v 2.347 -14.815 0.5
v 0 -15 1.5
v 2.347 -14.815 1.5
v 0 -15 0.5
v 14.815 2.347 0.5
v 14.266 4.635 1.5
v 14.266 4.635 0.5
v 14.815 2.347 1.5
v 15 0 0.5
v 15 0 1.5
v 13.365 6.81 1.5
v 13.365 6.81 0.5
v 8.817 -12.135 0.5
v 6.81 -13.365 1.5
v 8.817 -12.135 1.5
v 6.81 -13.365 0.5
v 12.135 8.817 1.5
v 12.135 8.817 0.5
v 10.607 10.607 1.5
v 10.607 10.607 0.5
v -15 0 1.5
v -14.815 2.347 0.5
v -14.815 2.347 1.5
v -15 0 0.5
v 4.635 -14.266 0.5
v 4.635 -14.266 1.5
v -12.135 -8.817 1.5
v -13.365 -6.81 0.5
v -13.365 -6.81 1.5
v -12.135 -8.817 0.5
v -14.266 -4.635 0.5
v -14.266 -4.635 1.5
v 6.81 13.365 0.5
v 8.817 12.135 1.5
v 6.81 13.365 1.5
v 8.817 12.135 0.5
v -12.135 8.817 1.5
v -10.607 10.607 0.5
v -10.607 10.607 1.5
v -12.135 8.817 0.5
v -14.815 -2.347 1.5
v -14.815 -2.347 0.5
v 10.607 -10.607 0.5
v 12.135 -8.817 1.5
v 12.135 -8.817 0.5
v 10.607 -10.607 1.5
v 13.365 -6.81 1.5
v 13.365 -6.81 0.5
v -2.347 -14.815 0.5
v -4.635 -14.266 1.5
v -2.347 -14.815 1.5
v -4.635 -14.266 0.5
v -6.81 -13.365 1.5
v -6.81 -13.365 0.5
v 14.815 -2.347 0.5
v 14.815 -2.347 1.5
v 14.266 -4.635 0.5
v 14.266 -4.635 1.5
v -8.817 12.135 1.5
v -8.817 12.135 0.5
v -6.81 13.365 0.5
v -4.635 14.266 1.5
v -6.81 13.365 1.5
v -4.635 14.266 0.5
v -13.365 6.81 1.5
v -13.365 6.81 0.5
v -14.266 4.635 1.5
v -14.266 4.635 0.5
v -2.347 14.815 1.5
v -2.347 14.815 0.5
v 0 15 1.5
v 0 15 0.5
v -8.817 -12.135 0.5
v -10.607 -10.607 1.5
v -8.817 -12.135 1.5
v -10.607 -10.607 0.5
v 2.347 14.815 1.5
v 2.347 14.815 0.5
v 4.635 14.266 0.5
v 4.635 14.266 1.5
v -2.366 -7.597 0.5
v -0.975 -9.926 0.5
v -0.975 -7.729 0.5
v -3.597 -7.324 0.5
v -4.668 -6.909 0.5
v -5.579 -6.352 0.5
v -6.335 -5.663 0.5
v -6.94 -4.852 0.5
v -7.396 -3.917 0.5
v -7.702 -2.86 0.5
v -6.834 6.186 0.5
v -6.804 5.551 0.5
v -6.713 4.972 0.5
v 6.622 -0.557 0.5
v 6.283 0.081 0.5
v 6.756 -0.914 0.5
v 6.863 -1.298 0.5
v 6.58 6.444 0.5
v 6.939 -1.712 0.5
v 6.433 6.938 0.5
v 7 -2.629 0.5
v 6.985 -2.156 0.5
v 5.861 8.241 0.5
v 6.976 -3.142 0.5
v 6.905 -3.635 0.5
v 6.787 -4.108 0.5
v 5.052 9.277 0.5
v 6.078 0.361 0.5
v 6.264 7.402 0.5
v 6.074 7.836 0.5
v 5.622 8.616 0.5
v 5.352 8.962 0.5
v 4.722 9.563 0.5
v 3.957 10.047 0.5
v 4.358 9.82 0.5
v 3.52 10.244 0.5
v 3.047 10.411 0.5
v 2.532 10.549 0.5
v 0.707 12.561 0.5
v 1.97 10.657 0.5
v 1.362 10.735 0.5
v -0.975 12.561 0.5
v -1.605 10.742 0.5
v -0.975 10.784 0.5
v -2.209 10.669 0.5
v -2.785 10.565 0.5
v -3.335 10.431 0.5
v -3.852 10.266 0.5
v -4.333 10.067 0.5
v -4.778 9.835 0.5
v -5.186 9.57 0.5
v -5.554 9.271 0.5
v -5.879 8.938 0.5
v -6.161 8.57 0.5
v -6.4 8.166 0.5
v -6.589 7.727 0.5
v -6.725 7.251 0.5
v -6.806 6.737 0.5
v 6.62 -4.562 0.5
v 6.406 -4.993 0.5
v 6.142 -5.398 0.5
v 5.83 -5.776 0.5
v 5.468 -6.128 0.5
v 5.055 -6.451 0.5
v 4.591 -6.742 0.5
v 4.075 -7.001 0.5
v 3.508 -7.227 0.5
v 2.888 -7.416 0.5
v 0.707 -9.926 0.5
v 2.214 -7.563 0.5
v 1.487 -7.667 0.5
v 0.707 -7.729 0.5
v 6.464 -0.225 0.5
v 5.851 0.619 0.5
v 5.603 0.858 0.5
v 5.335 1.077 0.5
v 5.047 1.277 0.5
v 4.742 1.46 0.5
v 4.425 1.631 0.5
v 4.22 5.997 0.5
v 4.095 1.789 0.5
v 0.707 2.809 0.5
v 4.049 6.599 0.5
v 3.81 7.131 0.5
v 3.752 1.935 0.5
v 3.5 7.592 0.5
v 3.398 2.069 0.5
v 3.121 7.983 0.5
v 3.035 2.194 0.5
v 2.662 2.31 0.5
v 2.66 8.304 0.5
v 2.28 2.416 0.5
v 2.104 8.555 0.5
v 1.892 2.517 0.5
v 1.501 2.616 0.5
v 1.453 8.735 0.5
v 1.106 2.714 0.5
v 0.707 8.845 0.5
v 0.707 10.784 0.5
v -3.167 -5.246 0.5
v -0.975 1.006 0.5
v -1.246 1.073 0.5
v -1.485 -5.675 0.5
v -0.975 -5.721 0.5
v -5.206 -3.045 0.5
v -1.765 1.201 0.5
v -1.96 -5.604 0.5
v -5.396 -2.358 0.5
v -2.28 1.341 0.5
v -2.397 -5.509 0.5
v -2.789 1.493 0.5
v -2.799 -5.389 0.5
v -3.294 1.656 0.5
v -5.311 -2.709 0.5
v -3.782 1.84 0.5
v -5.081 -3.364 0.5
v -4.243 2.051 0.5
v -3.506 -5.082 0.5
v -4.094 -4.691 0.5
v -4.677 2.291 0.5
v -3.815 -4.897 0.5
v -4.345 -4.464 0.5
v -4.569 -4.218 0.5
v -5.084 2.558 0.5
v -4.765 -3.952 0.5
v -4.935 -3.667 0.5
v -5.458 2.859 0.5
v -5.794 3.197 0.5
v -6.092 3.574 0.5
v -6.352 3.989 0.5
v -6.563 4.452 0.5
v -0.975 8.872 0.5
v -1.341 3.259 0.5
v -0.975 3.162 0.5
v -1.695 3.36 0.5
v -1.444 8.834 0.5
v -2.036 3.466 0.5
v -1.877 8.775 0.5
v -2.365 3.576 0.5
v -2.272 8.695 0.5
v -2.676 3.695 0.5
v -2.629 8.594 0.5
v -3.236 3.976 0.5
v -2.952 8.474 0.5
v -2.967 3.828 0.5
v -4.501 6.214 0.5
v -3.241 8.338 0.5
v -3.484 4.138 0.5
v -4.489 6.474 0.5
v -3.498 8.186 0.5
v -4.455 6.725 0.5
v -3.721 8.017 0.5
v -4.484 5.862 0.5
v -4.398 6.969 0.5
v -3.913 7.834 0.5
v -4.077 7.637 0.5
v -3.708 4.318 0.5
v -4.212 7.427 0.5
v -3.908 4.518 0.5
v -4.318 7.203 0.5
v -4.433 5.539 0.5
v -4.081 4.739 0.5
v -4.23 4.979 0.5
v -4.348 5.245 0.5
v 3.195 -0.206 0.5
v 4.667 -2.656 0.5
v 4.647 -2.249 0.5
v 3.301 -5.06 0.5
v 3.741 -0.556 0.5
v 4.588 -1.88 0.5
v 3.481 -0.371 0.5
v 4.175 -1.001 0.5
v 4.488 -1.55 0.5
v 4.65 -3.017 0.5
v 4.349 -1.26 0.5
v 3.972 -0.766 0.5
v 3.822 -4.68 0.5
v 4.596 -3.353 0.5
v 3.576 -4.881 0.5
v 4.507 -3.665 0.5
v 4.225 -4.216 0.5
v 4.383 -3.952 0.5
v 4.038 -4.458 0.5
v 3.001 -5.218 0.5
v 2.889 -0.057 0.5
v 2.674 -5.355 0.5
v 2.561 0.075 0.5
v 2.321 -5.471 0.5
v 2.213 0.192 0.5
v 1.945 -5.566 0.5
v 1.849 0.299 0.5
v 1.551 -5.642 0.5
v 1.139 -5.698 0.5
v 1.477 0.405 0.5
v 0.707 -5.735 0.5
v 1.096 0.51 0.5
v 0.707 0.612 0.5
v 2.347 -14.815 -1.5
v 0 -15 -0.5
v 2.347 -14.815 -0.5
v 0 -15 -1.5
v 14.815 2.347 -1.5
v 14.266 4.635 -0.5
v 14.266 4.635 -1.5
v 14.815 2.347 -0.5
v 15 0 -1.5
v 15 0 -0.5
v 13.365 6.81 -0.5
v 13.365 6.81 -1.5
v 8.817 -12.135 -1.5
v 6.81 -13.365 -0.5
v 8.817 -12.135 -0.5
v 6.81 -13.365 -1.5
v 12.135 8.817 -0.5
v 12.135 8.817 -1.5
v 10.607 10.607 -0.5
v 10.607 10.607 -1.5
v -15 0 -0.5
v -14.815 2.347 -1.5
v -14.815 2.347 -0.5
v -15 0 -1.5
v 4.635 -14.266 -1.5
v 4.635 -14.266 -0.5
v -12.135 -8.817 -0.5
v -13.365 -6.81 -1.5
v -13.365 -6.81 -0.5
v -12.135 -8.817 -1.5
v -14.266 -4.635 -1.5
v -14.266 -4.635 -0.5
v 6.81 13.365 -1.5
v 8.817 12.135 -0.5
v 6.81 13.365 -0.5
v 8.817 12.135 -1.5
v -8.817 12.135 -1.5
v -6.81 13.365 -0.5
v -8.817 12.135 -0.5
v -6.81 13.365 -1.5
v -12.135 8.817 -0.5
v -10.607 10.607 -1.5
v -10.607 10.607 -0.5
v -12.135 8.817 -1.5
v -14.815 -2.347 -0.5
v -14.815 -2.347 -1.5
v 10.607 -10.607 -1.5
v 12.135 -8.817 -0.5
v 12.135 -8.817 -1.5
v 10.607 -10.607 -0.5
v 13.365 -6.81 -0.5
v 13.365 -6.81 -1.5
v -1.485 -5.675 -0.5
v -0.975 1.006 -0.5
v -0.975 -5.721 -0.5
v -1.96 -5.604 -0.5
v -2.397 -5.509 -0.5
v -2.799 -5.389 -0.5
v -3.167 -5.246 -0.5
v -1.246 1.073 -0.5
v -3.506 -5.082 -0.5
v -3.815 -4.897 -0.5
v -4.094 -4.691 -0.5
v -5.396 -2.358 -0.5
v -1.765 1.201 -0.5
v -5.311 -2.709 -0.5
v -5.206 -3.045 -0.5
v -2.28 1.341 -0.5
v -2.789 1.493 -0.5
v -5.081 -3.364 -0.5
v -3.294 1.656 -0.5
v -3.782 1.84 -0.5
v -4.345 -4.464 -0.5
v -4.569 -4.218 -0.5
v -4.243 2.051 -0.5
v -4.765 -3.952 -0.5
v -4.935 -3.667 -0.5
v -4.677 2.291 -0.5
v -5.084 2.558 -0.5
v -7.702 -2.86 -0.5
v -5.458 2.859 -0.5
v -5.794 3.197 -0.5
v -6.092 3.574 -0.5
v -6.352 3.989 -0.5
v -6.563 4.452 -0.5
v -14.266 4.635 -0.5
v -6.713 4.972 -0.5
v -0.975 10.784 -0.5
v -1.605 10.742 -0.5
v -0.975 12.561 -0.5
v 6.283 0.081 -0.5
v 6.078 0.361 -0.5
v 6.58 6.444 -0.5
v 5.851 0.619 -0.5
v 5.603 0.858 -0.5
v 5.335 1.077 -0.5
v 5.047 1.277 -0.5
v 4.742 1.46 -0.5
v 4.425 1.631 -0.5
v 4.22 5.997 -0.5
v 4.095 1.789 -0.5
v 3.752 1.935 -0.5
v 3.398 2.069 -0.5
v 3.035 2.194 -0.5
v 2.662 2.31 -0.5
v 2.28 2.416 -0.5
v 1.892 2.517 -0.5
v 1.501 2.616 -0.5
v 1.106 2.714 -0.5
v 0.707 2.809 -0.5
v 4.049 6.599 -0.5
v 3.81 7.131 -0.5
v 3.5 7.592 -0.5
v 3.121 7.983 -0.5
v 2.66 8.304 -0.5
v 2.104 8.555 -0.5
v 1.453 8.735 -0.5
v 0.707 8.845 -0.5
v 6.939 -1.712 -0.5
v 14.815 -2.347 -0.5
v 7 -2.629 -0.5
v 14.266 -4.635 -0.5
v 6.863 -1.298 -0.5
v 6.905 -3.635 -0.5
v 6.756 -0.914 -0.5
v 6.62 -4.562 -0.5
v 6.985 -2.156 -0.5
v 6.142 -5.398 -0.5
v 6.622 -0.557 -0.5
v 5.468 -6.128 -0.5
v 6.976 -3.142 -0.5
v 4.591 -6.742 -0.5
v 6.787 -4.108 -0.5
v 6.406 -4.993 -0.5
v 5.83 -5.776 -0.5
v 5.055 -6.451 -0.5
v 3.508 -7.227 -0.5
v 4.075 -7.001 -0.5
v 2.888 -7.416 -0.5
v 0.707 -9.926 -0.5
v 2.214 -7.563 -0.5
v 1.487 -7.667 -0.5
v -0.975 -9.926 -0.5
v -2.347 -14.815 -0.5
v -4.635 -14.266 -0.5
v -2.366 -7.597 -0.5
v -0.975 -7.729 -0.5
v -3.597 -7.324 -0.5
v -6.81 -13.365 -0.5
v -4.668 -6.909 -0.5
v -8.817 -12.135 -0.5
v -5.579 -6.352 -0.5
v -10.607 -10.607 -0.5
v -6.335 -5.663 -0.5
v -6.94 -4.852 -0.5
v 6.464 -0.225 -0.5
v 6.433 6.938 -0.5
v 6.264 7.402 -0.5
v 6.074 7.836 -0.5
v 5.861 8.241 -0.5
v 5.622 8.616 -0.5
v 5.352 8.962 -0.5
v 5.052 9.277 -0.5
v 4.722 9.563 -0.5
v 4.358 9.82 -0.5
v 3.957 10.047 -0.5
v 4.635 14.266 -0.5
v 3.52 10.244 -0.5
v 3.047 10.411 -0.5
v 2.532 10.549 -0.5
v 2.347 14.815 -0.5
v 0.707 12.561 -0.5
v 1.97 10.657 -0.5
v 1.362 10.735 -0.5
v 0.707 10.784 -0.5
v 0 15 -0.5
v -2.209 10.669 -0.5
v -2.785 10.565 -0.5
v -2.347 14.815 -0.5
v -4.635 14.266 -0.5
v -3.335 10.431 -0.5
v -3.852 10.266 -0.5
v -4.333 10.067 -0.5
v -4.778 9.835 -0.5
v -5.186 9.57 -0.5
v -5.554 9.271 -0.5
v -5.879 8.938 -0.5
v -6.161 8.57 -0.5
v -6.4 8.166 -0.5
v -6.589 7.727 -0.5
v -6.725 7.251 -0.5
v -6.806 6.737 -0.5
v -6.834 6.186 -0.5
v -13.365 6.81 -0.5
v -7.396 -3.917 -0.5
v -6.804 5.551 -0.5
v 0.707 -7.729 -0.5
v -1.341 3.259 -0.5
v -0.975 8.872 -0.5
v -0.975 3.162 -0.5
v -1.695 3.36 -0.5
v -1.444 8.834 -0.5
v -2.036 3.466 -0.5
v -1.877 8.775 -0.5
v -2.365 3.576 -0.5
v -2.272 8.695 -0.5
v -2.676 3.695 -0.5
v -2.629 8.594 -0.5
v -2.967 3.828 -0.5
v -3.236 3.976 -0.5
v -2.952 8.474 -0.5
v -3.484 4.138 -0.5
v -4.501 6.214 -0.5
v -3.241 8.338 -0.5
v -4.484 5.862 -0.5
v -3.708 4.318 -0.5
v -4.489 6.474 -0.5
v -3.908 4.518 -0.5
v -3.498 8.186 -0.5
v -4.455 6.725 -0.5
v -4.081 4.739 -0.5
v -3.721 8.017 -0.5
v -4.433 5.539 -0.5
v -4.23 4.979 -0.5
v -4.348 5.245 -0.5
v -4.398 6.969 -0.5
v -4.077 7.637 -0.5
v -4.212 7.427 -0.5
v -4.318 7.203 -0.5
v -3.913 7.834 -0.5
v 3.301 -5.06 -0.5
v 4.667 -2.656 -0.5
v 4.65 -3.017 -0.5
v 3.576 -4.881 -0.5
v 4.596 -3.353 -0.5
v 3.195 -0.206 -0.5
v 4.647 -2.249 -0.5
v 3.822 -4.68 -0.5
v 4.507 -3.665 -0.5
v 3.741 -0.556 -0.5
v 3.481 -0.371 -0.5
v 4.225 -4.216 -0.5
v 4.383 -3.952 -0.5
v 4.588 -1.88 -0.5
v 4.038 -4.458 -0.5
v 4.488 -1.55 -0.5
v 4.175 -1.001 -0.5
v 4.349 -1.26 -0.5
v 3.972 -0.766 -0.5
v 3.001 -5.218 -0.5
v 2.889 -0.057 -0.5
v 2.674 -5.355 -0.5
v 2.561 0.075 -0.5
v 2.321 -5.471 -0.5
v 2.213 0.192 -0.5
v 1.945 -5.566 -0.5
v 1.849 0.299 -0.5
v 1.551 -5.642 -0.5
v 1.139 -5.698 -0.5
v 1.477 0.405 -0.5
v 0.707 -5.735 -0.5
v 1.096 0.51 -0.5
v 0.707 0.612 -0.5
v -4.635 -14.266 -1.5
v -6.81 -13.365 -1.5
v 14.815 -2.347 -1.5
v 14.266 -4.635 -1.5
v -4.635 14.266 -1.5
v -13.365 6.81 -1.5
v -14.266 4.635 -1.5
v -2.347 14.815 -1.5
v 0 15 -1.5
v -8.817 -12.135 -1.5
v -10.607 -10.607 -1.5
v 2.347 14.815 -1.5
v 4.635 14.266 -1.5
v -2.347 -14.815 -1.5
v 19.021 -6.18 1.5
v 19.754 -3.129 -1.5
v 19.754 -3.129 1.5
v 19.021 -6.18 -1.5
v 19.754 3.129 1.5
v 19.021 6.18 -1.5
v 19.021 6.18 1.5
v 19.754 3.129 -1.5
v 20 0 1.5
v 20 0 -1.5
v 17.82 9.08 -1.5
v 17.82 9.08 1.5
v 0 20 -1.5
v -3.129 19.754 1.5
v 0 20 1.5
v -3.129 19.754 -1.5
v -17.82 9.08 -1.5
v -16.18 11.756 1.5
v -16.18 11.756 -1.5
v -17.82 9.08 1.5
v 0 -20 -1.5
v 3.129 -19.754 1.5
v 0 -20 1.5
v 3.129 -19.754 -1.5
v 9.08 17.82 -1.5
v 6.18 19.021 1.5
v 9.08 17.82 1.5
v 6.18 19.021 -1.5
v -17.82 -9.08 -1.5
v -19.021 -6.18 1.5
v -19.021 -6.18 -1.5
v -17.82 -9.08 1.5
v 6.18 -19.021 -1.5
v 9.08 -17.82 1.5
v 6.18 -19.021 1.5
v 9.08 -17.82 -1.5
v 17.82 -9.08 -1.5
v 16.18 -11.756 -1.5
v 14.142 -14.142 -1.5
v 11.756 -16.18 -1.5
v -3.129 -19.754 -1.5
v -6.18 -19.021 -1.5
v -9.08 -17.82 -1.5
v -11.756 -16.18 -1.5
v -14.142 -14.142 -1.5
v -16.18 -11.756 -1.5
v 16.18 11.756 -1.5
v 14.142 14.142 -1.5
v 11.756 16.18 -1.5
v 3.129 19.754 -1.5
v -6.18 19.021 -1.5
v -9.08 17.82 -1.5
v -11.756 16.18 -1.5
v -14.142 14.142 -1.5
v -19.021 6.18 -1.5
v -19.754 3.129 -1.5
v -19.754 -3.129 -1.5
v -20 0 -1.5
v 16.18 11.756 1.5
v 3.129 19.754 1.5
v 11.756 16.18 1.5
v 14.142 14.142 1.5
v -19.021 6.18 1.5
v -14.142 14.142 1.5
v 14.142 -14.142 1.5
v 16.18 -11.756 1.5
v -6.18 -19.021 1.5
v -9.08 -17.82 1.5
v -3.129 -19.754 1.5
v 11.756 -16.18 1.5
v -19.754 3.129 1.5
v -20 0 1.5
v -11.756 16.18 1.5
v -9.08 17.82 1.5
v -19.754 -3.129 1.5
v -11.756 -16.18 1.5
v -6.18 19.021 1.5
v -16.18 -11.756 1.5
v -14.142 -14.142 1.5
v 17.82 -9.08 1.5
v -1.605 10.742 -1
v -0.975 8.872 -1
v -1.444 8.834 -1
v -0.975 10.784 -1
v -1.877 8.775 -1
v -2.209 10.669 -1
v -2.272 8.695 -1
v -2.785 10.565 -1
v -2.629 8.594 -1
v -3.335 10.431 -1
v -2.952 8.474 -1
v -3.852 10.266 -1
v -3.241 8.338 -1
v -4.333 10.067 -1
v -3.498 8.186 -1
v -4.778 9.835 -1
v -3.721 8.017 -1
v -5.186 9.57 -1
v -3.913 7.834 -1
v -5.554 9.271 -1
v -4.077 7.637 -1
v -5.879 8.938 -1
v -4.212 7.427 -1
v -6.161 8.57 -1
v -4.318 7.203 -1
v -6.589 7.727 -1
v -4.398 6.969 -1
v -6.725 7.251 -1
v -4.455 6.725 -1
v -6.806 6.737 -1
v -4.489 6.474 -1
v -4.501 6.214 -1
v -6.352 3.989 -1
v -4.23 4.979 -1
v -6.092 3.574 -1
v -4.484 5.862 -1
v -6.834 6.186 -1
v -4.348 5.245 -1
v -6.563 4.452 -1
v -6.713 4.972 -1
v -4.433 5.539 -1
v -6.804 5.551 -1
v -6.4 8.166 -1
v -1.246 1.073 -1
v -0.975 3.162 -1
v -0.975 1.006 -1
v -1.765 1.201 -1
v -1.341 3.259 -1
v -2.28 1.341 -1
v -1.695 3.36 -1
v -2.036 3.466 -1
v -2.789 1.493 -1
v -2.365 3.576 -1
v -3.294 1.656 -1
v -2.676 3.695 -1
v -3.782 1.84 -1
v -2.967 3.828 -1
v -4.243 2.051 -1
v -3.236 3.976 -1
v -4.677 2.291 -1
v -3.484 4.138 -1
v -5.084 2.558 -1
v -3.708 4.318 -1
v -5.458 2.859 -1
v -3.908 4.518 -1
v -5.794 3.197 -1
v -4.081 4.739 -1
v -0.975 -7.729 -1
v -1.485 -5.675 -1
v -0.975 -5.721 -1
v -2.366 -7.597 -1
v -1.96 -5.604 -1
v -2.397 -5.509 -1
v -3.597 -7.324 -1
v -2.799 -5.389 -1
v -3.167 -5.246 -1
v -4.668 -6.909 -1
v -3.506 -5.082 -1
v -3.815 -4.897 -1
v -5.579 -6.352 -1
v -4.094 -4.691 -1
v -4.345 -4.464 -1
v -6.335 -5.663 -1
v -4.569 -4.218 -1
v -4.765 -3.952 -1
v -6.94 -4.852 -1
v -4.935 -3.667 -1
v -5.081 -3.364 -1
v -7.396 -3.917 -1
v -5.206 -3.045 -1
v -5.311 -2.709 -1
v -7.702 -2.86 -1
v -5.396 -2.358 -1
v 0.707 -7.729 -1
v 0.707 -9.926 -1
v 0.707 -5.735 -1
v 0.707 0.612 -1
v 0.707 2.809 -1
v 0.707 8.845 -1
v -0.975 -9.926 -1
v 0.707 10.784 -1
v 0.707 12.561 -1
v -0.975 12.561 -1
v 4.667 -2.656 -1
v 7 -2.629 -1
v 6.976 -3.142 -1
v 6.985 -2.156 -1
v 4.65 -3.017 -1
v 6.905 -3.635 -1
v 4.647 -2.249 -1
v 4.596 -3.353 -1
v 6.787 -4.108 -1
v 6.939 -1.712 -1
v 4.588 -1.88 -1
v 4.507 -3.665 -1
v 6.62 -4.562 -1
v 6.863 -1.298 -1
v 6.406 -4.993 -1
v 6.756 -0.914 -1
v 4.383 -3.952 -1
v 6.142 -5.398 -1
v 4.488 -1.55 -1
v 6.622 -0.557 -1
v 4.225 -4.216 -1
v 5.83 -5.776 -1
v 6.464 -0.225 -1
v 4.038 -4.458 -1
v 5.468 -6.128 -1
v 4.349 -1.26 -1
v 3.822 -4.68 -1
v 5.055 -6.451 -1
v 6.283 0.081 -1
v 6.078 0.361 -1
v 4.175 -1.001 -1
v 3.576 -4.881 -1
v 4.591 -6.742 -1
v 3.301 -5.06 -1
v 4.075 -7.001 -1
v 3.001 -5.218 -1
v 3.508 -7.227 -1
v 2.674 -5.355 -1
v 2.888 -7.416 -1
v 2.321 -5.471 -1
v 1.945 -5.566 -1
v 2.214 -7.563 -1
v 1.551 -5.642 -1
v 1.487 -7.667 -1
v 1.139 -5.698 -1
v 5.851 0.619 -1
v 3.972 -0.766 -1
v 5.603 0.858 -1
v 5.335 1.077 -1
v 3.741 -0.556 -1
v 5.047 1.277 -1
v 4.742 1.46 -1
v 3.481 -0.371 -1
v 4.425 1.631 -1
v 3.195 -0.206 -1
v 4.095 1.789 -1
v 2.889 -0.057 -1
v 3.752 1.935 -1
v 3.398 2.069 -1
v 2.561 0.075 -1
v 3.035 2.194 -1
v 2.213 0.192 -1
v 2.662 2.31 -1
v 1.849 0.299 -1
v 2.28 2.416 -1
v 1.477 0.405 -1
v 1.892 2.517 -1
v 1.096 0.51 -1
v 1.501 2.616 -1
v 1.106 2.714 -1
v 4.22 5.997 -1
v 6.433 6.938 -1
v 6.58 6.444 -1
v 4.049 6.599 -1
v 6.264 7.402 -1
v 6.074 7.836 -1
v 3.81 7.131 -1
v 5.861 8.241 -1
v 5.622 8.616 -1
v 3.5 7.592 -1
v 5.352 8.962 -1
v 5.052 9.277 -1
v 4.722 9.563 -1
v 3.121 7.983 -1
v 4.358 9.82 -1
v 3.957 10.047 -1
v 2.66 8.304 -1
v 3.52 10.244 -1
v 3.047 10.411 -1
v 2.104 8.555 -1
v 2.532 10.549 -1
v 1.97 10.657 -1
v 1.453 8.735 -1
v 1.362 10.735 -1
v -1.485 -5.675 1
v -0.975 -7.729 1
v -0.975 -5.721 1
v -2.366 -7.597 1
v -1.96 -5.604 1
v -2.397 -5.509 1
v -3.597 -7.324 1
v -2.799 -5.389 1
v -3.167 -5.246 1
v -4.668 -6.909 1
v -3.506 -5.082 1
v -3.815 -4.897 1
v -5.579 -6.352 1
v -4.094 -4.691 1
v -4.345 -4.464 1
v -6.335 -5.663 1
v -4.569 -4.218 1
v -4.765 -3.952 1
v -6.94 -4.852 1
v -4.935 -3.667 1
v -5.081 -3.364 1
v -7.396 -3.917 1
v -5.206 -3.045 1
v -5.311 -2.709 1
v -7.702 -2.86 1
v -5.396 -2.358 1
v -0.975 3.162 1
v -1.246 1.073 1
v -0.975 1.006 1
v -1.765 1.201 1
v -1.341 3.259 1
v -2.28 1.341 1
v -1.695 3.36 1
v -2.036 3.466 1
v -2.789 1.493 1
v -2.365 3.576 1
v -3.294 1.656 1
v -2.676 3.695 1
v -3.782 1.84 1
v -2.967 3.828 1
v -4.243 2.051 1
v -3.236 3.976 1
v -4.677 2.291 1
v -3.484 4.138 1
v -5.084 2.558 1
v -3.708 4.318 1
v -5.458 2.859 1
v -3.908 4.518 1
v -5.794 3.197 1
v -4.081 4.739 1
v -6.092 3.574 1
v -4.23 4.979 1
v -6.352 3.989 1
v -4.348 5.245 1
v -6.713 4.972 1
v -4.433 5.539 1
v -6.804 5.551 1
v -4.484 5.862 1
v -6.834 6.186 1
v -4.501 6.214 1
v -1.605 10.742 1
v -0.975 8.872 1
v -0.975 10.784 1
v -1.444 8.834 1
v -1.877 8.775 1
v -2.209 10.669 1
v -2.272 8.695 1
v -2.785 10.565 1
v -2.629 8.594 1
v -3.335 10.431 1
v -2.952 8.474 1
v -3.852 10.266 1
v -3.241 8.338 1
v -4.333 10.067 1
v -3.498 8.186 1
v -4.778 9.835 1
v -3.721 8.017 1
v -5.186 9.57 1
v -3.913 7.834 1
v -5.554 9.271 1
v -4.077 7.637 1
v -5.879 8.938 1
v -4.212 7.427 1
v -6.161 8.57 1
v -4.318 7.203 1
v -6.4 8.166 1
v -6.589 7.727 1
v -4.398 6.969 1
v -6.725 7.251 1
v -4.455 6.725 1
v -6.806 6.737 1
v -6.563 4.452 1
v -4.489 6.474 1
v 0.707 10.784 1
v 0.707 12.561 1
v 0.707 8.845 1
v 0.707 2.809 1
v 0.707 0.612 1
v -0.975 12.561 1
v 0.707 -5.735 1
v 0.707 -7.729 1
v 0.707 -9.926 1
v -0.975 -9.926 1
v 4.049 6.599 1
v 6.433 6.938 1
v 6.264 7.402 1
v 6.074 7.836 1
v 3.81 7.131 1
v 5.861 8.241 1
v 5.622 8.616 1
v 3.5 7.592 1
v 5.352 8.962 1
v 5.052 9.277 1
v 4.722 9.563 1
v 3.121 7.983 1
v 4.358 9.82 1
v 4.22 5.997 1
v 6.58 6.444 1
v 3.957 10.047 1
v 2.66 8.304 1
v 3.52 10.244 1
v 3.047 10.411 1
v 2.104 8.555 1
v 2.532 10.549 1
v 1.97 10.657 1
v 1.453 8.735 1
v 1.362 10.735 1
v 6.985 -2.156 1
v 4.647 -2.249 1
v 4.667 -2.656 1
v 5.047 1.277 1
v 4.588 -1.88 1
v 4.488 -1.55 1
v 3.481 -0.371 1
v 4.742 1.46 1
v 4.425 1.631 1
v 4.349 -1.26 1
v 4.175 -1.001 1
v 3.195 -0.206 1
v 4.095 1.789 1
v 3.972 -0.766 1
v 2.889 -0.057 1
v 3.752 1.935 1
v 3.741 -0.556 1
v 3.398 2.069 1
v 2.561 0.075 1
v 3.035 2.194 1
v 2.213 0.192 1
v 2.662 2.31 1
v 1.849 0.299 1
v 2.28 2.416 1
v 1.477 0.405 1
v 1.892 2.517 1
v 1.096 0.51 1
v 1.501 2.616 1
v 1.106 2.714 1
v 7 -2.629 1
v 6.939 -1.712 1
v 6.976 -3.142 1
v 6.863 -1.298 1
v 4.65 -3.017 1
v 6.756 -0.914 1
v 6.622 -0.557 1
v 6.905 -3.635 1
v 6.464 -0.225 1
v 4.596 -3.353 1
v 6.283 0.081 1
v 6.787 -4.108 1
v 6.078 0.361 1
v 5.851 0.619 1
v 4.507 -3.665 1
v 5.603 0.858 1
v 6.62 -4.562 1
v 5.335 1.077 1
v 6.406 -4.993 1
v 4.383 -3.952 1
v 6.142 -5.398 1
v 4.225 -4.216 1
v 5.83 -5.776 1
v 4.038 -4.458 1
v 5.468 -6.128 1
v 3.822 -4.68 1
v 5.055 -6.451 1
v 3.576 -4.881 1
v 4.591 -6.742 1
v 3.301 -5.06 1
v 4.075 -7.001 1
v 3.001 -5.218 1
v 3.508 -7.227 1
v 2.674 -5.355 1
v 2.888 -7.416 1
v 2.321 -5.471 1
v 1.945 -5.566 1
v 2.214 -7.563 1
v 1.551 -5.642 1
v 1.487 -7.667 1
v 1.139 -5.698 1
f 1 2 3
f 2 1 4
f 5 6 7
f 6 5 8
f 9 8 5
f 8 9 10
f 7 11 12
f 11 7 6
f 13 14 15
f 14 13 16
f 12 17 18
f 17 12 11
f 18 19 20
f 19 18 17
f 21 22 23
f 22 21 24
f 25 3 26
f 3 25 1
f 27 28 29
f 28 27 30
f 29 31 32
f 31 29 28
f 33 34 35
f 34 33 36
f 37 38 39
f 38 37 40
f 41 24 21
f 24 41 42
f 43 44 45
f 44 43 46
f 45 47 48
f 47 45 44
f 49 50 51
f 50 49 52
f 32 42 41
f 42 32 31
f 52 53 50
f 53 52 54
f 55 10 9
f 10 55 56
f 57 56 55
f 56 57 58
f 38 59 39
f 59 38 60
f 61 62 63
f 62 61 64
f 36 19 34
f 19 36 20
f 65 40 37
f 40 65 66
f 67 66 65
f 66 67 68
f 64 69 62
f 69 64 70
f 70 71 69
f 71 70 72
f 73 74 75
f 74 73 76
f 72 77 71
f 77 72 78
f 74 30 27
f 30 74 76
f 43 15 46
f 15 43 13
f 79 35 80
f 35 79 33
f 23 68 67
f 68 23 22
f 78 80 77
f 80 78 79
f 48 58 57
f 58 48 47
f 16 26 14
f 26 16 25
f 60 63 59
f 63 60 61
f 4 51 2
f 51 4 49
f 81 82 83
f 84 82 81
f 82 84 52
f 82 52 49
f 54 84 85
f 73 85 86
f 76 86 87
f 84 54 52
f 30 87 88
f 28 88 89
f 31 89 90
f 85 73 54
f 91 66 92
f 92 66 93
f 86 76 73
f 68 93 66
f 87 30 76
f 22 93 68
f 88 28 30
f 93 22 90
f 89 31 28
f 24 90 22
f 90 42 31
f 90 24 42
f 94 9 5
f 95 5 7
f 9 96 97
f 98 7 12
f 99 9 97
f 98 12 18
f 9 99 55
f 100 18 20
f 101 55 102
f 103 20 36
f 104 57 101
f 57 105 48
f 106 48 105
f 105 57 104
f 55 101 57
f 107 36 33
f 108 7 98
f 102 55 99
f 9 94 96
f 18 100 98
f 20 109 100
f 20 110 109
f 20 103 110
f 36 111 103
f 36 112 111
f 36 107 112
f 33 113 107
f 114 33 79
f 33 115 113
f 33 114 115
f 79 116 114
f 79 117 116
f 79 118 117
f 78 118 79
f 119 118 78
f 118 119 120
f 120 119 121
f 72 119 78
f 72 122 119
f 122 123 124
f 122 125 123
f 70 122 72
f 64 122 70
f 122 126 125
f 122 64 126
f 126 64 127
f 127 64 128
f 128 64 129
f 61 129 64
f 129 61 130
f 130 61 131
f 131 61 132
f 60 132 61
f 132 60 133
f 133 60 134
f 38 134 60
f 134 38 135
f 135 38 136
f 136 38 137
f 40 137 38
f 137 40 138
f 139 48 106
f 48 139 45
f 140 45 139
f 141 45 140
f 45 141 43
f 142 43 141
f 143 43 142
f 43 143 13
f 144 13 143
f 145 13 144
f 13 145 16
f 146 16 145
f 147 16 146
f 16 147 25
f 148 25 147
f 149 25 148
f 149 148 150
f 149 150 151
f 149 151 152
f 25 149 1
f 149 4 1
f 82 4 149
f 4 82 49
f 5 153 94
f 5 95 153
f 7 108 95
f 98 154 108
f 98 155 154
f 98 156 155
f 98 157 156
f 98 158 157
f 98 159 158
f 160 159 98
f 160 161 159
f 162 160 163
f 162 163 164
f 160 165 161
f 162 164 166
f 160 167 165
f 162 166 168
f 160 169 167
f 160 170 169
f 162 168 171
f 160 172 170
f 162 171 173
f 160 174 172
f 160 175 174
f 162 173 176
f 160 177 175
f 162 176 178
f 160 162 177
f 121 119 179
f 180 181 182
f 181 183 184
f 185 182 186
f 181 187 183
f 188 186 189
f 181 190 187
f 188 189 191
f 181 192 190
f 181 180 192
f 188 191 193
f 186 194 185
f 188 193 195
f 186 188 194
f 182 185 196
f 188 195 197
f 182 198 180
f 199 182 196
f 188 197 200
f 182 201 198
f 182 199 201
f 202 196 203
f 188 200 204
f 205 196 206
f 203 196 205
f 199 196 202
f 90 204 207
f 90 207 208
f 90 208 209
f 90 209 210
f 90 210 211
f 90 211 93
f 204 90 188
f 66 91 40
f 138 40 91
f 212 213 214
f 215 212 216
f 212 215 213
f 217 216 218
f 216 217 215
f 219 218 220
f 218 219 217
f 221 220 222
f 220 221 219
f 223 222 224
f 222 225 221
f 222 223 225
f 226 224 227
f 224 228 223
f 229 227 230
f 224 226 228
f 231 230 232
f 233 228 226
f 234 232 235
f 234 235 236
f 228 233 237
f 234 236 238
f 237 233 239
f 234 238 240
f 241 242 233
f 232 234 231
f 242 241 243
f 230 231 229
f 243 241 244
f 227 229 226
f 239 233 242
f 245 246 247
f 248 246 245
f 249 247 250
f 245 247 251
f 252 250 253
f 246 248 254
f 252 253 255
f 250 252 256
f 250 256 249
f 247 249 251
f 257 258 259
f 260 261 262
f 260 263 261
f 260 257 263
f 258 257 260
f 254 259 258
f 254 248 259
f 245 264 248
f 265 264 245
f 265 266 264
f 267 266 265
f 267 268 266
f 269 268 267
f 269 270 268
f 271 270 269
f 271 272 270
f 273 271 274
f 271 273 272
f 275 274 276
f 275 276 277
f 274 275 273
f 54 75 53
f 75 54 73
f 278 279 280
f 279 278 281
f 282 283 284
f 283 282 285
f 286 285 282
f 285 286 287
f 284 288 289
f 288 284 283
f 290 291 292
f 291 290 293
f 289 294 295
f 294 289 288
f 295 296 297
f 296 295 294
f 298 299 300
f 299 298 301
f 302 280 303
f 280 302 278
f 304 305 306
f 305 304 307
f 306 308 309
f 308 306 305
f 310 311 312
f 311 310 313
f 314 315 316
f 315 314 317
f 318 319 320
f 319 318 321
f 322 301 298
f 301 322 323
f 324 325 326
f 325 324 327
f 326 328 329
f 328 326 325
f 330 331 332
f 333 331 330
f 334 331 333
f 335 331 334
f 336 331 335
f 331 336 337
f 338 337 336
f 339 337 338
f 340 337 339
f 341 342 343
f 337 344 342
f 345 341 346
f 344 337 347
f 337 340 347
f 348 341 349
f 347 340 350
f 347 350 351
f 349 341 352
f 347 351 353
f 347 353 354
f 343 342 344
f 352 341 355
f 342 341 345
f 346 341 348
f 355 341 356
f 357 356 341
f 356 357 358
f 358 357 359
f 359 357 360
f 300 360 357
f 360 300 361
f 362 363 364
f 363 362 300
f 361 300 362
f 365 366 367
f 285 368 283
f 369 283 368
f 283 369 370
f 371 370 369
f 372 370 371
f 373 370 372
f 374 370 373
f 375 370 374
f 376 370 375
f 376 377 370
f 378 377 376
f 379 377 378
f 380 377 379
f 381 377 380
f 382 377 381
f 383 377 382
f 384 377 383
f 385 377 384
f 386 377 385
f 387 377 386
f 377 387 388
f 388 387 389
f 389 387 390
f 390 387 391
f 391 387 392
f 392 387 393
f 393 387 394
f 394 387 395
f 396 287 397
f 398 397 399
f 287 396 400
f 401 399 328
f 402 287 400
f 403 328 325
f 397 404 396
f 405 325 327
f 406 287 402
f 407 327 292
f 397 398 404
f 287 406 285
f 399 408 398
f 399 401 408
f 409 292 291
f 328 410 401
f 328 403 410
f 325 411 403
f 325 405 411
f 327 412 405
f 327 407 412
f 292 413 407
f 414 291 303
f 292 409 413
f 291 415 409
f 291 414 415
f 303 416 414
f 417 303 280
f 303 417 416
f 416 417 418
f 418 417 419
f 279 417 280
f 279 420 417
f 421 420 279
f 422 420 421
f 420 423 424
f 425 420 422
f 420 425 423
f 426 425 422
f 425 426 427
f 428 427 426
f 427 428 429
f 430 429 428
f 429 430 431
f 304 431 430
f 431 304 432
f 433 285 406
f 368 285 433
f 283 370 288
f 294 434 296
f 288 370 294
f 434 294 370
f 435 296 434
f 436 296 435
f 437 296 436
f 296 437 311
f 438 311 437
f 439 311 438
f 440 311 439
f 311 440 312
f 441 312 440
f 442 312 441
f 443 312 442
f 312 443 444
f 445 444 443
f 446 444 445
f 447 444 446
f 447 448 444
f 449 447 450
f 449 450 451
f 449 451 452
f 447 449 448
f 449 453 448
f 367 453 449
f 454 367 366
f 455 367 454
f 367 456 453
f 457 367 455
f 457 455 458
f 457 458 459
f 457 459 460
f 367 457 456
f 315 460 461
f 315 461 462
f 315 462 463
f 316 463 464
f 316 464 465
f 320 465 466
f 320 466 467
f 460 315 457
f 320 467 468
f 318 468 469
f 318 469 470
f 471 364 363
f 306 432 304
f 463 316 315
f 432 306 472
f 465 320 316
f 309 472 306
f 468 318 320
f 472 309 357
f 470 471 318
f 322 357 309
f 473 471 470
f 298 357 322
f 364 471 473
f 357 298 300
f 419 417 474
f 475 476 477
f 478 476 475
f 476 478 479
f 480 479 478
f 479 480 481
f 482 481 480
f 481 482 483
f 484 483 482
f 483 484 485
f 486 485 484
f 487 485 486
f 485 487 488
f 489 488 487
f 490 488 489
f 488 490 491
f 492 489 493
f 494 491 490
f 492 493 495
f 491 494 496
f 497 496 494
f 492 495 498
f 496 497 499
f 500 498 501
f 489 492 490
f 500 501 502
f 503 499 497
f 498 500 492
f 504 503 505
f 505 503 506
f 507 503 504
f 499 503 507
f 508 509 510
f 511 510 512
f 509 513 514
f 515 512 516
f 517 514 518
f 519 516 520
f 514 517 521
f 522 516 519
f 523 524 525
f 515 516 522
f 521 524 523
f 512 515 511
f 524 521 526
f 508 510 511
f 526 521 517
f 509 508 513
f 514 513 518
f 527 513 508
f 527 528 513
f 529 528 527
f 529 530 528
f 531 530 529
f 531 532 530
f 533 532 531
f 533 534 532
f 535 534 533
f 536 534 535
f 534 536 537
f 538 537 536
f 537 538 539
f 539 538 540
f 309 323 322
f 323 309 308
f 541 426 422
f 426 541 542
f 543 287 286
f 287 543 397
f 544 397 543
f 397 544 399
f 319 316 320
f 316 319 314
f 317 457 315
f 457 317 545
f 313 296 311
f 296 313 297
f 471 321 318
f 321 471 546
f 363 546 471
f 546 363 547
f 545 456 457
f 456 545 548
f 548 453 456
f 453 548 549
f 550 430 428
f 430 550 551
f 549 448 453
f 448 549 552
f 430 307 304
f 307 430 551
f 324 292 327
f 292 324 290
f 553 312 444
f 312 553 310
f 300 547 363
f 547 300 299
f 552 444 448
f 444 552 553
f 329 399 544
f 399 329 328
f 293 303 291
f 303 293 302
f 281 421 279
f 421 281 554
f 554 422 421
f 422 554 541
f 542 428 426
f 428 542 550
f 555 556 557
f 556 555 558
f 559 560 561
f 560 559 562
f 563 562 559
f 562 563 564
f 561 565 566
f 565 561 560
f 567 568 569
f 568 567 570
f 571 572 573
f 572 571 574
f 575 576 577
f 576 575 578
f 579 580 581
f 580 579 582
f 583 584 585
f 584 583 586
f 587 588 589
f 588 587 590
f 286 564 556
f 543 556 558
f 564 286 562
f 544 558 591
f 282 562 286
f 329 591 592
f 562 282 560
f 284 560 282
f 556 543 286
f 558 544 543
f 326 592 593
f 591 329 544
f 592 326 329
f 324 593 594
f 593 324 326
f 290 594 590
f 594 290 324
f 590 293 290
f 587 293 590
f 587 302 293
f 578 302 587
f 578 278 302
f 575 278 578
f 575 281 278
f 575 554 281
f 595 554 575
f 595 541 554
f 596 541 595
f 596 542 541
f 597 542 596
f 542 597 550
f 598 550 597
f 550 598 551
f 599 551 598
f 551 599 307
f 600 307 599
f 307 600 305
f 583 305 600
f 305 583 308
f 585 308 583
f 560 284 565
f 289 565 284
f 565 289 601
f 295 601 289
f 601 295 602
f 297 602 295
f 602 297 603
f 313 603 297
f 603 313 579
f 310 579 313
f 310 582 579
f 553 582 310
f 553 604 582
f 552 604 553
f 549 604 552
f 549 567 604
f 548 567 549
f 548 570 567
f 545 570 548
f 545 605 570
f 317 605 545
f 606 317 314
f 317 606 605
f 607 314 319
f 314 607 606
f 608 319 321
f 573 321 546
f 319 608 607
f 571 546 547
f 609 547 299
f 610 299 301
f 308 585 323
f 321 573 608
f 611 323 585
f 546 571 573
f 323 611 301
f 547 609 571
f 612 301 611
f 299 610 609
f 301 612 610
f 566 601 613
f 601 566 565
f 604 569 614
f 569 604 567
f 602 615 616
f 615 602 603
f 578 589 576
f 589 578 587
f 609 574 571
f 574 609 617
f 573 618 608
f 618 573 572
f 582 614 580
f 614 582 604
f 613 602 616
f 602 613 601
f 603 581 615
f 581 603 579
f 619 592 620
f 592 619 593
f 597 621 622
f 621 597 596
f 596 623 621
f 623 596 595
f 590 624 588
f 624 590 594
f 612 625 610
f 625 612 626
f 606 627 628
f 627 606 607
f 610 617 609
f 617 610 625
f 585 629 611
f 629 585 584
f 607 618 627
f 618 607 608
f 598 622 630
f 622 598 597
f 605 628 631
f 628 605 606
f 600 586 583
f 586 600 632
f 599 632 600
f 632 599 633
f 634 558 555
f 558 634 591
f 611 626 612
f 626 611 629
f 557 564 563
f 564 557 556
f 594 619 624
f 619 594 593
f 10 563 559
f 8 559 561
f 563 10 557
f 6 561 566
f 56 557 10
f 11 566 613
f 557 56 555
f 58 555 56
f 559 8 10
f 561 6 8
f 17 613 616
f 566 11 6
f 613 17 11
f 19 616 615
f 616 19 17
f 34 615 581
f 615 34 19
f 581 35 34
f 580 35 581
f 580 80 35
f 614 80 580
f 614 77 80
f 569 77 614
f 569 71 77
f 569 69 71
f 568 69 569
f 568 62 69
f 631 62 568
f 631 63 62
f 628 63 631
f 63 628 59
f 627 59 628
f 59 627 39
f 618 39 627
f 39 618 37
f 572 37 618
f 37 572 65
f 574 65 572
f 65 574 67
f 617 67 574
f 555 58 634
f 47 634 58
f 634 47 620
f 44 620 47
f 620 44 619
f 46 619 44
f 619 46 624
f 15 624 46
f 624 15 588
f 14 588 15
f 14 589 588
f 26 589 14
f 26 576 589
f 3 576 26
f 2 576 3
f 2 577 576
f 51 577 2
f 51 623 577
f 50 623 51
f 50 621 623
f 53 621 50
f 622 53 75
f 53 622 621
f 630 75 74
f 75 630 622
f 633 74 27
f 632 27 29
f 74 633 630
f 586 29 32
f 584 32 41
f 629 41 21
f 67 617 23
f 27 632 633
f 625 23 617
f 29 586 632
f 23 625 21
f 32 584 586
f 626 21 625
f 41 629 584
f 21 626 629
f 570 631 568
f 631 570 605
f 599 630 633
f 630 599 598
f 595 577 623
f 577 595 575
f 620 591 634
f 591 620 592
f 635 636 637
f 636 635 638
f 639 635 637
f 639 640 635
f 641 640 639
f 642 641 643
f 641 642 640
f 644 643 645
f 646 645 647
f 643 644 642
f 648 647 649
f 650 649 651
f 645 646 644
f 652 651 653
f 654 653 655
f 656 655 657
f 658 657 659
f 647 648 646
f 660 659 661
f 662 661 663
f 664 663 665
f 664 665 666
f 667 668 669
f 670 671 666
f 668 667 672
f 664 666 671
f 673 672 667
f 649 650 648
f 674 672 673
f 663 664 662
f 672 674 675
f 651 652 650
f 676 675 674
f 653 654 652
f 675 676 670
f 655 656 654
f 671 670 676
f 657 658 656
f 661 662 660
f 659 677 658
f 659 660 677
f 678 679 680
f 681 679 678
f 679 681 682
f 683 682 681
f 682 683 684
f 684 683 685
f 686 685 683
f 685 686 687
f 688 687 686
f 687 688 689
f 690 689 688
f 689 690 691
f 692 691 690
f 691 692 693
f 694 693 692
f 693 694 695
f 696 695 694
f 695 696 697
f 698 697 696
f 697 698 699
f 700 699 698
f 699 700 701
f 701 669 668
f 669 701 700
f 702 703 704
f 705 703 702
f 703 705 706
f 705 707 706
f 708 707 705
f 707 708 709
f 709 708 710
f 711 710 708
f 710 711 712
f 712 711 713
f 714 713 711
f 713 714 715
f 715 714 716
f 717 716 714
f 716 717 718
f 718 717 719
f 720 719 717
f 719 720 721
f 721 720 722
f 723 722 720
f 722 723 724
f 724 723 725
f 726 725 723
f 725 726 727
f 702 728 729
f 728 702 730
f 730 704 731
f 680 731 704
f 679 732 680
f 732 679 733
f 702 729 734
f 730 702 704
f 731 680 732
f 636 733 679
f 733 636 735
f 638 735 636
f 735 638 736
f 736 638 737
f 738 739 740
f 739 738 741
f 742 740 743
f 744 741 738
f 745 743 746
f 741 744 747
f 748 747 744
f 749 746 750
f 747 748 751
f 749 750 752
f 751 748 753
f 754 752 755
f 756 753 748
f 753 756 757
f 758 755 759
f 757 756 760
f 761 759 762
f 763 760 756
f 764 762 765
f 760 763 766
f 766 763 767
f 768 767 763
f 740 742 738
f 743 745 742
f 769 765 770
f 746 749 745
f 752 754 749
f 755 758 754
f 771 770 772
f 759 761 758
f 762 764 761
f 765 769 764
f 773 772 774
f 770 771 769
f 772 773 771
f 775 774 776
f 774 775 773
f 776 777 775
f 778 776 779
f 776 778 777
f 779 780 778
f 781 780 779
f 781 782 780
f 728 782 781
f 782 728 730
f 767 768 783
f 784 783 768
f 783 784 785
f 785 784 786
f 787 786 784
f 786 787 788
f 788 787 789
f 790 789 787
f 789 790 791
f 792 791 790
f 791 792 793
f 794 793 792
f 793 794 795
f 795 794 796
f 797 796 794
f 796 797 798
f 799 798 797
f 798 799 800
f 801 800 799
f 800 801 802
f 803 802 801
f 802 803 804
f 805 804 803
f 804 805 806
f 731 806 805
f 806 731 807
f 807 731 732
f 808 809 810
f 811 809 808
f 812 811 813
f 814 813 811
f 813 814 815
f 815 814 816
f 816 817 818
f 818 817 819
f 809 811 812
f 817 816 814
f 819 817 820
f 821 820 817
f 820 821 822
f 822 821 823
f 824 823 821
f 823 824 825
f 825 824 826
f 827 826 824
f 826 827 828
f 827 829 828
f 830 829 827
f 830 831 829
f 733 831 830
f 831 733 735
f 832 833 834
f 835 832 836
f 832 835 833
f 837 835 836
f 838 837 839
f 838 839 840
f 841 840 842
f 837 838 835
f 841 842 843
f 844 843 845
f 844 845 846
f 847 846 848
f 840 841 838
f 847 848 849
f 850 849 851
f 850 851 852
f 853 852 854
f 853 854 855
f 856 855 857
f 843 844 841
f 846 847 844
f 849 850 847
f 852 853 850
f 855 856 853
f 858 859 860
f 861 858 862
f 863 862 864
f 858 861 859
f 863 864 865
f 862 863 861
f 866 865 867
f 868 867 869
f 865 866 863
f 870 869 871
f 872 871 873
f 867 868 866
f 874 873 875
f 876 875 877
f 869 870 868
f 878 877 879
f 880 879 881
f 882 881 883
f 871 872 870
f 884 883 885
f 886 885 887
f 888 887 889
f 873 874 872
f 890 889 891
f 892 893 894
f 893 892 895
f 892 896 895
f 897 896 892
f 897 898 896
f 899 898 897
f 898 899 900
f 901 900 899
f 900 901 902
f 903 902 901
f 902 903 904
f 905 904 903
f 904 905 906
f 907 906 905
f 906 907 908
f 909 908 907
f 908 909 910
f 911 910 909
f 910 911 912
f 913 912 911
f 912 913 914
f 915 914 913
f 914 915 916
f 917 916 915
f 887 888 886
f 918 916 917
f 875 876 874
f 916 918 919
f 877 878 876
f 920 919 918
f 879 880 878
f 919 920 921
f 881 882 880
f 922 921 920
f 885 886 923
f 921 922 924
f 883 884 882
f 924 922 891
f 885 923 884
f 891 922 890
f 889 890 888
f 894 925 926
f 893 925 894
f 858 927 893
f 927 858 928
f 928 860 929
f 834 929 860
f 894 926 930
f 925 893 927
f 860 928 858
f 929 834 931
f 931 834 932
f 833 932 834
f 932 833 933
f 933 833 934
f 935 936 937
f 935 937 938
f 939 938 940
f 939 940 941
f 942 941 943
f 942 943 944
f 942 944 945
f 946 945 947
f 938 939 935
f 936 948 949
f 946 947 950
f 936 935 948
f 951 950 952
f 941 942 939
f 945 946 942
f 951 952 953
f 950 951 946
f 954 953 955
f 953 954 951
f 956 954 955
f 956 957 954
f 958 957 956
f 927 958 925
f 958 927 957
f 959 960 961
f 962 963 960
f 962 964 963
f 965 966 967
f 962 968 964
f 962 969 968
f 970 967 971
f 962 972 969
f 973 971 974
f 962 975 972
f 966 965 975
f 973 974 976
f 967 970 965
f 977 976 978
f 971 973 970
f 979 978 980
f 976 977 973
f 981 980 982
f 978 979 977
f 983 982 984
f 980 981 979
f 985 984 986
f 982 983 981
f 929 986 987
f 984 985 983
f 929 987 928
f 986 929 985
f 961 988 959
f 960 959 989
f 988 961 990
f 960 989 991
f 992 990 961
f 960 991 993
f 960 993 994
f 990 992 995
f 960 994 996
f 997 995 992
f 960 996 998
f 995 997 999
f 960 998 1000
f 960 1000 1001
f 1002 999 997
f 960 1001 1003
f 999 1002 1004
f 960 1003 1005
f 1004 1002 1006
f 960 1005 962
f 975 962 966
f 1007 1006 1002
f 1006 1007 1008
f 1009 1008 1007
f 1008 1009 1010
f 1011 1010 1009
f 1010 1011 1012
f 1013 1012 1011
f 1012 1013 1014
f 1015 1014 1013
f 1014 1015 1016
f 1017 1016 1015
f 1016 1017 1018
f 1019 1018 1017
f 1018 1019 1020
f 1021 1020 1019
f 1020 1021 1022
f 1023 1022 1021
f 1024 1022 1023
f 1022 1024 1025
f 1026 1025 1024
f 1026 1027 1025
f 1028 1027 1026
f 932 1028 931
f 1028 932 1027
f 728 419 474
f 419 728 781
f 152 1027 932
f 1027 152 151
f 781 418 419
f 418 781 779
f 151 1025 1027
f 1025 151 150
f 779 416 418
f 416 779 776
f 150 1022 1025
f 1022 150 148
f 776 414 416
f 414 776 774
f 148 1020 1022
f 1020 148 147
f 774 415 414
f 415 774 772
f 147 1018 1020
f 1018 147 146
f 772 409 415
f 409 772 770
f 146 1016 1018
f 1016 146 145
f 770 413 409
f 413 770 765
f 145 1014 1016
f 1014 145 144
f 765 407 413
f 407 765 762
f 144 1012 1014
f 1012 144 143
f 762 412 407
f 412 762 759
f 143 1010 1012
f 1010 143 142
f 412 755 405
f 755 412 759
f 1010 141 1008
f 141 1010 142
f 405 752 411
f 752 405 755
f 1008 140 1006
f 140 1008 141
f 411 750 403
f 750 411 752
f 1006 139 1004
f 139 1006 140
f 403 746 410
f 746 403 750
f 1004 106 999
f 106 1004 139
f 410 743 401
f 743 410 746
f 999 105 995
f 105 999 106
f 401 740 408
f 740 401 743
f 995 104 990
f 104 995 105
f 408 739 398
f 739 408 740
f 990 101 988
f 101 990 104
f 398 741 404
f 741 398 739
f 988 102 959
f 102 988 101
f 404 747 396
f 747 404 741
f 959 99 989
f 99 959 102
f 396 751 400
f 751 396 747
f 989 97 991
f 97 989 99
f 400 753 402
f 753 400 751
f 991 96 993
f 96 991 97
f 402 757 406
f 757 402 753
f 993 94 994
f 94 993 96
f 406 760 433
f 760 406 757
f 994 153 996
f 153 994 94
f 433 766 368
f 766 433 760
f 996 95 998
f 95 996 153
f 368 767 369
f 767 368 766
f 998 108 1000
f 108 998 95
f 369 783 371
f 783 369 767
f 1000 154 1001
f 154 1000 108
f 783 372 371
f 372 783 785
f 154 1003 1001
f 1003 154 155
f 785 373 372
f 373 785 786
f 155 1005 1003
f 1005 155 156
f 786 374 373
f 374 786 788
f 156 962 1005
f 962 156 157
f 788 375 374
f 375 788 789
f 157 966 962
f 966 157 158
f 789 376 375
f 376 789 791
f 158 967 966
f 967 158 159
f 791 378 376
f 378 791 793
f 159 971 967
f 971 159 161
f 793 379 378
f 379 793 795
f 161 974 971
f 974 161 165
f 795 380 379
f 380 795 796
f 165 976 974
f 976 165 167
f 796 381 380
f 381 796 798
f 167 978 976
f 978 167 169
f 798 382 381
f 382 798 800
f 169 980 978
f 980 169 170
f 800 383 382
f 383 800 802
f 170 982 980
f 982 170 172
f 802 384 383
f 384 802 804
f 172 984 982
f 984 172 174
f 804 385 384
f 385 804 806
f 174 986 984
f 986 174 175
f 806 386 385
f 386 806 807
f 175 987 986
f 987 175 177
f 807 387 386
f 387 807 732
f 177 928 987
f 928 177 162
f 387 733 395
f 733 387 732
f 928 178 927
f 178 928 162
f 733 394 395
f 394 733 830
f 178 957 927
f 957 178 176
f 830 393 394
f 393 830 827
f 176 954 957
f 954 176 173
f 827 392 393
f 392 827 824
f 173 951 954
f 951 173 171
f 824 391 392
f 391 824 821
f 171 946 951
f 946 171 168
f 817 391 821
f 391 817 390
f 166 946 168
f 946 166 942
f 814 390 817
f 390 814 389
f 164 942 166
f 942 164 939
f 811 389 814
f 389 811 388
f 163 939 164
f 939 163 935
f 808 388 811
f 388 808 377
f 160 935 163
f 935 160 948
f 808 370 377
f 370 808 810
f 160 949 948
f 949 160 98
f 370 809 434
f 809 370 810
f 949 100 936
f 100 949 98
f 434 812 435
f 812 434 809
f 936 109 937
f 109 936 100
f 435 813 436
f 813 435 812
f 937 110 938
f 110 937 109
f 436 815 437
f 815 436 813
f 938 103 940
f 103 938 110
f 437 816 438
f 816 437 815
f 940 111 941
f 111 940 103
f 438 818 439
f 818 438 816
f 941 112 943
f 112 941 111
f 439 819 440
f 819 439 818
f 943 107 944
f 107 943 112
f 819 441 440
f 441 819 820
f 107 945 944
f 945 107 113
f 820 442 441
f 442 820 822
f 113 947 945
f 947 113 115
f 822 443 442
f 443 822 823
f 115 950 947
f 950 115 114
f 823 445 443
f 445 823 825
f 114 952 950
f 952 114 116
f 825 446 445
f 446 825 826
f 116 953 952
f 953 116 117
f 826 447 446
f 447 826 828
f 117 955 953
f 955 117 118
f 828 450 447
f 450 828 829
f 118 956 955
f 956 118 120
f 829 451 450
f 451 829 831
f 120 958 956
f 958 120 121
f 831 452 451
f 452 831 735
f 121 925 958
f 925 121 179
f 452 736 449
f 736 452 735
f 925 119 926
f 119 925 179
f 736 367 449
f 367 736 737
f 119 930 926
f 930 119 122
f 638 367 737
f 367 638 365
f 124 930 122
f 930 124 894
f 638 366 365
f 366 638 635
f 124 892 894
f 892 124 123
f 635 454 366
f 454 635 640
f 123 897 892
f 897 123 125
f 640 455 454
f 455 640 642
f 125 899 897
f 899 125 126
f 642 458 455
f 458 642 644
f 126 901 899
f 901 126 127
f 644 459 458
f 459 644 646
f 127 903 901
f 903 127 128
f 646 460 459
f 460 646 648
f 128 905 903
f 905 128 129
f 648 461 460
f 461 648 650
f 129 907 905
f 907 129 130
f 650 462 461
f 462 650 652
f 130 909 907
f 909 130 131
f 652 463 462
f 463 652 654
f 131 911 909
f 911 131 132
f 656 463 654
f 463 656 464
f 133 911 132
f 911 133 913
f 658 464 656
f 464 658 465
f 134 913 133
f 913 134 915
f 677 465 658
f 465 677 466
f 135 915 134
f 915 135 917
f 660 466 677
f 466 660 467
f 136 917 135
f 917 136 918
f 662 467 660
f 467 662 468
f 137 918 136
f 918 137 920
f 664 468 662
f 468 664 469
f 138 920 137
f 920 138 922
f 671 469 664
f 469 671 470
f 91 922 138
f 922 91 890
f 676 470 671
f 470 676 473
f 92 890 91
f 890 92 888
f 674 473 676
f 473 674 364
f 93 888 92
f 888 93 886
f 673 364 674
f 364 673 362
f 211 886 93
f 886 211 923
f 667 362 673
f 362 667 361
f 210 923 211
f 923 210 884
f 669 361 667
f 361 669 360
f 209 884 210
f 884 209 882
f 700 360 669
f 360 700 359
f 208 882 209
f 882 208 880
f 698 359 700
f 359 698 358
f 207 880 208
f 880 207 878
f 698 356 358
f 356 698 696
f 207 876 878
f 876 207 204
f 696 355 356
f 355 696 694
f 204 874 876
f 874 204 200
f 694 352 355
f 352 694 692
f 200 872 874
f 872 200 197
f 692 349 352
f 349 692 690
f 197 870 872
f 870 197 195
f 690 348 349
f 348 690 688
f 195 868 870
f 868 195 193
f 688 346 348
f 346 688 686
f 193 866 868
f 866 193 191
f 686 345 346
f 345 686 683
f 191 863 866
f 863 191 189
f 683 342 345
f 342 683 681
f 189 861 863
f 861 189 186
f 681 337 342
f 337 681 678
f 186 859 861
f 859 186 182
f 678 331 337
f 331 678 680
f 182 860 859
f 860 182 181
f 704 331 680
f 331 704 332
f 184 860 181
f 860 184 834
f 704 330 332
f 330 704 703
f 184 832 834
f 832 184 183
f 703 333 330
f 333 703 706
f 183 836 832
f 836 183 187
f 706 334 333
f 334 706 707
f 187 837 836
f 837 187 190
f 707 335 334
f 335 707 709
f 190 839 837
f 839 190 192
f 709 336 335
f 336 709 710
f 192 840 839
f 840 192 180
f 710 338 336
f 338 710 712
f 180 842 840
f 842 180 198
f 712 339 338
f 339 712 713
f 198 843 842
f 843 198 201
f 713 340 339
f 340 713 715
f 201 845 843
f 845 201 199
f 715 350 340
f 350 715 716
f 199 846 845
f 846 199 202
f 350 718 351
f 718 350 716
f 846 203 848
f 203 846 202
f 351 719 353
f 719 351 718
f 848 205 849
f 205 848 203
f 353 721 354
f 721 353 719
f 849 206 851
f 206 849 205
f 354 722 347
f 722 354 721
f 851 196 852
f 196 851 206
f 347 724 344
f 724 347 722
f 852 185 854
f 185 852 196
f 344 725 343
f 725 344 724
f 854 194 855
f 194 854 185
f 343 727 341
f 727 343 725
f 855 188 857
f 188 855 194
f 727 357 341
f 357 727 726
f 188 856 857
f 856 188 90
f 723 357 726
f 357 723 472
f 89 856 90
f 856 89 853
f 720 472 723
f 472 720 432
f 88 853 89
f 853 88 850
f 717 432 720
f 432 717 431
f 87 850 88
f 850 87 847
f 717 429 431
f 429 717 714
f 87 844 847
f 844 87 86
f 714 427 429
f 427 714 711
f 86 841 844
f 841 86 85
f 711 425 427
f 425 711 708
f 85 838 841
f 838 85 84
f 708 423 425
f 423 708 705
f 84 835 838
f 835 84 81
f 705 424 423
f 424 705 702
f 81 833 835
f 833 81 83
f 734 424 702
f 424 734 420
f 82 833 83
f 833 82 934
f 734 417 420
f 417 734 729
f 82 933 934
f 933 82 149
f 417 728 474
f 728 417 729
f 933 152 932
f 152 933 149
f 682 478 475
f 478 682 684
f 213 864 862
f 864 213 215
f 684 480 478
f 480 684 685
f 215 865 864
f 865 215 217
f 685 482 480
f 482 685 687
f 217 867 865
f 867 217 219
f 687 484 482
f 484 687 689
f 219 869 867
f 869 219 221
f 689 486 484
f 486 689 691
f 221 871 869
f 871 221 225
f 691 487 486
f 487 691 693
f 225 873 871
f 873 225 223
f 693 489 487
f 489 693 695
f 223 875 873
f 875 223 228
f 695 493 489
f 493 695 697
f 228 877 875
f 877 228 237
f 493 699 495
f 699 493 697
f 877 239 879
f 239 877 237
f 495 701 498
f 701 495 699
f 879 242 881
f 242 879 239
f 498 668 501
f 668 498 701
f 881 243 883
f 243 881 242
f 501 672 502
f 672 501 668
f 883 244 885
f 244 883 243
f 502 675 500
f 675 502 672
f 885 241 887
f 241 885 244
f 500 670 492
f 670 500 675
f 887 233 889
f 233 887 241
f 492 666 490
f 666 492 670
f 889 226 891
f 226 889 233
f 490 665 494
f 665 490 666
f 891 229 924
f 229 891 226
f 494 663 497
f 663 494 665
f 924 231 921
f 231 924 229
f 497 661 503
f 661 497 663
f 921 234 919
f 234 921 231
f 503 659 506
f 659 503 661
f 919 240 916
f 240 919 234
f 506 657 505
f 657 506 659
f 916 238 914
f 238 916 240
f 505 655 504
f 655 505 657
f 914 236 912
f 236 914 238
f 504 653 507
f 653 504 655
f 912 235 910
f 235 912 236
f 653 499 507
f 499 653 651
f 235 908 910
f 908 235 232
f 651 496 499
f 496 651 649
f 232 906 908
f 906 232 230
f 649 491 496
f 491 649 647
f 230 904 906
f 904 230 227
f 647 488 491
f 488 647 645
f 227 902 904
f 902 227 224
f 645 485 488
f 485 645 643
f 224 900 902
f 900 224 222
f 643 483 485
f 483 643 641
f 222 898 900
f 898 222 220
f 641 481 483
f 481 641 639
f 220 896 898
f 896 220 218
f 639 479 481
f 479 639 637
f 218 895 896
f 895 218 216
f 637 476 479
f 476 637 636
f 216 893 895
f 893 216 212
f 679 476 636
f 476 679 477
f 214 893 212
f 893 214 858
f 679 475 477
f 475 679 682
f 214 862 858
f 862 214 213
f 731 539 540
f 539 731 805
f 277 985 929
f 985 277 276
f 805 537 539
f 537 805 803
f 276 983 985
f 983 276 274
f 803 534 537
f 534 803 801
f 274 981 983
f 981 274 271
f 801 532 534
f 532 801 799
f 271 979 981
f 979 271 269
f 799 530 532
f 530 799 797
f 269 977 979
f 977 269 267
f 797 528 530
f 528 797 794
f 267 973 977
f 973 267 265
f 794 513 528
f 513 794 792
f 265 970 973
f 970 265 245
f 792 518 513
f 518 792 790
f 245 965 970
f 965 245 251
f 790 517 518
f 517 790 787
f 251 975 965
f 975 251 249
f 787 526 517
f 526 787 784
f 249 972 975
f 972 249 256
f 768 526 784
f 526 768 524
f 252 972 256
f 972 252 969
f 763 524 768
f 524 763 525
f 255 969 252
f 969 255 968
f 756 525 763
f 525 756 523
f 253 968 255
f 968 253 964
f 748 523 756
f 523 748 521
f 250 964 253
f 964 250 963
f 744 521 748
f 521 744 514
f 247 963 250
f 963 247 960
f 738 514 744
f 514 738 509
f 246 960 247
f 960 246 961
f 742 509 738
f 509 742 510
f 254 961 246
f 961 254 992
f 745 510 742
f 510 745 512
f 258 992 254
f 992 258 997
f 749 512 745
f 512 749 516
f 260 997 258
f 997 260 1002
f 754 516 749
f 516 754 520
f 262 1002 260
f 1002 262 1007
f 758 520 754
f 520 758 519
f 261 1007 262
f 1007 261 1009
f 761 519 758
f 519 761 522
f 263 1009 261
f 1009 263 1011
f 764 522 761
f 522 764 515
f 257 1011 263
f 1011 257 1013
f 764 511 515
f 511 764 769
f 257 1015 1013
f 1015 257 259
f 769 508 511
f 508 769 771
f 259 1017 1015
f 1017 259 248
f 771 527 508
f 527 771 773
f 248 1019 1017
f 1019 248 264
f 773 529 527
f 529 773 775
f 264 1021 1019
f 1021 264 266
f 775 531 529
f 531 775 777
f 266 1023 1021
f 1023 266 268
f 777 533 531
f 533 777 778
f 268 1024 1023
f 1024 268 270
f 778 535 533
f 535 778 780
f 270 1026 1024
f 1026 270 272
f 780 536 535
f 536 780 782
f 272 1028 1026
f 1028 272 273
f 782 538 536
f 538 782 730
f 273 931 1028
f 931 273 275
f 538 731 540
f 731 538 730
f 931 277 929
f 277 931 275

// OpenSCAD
module Coin_01(Mat = 0){

    //Color = [Main Body, Pocket] 
    bronze = ["#CD7F32","#7b4c1e"]; 
    silver = ["#c4aead","#cdc9c9"];
    gold = ["#ffd700","#daa520"];

    Material = [bronze,silver,gold];

    difference(){
            // Coin Main Body
            color(Material[Mat][0])
            cylinder(3,20,20, center= true, $fn = 40);
            
            // Make Pocket Hole
            color(Material[Mat][1]){   
            translate([0,0,2])
            cylinder(3,15,15, center= true, $fn = 40);
                 
            translate([0,0,-2])
            cylinder(3,15,15, center= true, $fn = 40);
            }

    
        }
       
    linear_extrude(2, center= true)
    translate([-8,-8,0])
    text("$",center = true, size = 20);  
}

Coin_01(Mat = 2);

// Written by Nicolì Angelo (Gengio) 2024: 
// MIT License

//Permission is hereby granted, free of charge, to any person obtaining a copy of this software and associated documentation files (the "Software"), to deal in the Software without restriction, including without limitation the rights to use, copy, modify, merge, publish, distribute, sublicense, and/or sell copies of the Software, and to permit persons to whom the Software is furnished to do so, subject to the following conditions:

//The above copyright notice and this permission notice shall be included in all copies or substantial portions of the Software.

//THE SOFTWARE IS PROVIDED "AS IS", WITHOUT WARRANTY OF ANY KIND, EXPRESS OR IMPLIED, INCLUDING BUT NOT LIMITED TO THE WARRANTIES OF MERCHANTABILITY, FITNESS FOR A PARTICULAR PURPOSE AND NONINFRINGEMENT. IN NO EVENT SHALL THE AUTHORS OR COPYRIGHT HOLDERS BE LIABLE FOR ANY CLAIM, DAMAGES OR OTHER LIABILITY, WHETHER IN AN ACTION OF CONTRACT, TORT OR OTHERWISE, ARISING FROM, OUT OF OR IN CONNECTION WITH THE SOFTWARE OR THE USE OR OTHER DEALINGS IN THE SOFTWARE.
